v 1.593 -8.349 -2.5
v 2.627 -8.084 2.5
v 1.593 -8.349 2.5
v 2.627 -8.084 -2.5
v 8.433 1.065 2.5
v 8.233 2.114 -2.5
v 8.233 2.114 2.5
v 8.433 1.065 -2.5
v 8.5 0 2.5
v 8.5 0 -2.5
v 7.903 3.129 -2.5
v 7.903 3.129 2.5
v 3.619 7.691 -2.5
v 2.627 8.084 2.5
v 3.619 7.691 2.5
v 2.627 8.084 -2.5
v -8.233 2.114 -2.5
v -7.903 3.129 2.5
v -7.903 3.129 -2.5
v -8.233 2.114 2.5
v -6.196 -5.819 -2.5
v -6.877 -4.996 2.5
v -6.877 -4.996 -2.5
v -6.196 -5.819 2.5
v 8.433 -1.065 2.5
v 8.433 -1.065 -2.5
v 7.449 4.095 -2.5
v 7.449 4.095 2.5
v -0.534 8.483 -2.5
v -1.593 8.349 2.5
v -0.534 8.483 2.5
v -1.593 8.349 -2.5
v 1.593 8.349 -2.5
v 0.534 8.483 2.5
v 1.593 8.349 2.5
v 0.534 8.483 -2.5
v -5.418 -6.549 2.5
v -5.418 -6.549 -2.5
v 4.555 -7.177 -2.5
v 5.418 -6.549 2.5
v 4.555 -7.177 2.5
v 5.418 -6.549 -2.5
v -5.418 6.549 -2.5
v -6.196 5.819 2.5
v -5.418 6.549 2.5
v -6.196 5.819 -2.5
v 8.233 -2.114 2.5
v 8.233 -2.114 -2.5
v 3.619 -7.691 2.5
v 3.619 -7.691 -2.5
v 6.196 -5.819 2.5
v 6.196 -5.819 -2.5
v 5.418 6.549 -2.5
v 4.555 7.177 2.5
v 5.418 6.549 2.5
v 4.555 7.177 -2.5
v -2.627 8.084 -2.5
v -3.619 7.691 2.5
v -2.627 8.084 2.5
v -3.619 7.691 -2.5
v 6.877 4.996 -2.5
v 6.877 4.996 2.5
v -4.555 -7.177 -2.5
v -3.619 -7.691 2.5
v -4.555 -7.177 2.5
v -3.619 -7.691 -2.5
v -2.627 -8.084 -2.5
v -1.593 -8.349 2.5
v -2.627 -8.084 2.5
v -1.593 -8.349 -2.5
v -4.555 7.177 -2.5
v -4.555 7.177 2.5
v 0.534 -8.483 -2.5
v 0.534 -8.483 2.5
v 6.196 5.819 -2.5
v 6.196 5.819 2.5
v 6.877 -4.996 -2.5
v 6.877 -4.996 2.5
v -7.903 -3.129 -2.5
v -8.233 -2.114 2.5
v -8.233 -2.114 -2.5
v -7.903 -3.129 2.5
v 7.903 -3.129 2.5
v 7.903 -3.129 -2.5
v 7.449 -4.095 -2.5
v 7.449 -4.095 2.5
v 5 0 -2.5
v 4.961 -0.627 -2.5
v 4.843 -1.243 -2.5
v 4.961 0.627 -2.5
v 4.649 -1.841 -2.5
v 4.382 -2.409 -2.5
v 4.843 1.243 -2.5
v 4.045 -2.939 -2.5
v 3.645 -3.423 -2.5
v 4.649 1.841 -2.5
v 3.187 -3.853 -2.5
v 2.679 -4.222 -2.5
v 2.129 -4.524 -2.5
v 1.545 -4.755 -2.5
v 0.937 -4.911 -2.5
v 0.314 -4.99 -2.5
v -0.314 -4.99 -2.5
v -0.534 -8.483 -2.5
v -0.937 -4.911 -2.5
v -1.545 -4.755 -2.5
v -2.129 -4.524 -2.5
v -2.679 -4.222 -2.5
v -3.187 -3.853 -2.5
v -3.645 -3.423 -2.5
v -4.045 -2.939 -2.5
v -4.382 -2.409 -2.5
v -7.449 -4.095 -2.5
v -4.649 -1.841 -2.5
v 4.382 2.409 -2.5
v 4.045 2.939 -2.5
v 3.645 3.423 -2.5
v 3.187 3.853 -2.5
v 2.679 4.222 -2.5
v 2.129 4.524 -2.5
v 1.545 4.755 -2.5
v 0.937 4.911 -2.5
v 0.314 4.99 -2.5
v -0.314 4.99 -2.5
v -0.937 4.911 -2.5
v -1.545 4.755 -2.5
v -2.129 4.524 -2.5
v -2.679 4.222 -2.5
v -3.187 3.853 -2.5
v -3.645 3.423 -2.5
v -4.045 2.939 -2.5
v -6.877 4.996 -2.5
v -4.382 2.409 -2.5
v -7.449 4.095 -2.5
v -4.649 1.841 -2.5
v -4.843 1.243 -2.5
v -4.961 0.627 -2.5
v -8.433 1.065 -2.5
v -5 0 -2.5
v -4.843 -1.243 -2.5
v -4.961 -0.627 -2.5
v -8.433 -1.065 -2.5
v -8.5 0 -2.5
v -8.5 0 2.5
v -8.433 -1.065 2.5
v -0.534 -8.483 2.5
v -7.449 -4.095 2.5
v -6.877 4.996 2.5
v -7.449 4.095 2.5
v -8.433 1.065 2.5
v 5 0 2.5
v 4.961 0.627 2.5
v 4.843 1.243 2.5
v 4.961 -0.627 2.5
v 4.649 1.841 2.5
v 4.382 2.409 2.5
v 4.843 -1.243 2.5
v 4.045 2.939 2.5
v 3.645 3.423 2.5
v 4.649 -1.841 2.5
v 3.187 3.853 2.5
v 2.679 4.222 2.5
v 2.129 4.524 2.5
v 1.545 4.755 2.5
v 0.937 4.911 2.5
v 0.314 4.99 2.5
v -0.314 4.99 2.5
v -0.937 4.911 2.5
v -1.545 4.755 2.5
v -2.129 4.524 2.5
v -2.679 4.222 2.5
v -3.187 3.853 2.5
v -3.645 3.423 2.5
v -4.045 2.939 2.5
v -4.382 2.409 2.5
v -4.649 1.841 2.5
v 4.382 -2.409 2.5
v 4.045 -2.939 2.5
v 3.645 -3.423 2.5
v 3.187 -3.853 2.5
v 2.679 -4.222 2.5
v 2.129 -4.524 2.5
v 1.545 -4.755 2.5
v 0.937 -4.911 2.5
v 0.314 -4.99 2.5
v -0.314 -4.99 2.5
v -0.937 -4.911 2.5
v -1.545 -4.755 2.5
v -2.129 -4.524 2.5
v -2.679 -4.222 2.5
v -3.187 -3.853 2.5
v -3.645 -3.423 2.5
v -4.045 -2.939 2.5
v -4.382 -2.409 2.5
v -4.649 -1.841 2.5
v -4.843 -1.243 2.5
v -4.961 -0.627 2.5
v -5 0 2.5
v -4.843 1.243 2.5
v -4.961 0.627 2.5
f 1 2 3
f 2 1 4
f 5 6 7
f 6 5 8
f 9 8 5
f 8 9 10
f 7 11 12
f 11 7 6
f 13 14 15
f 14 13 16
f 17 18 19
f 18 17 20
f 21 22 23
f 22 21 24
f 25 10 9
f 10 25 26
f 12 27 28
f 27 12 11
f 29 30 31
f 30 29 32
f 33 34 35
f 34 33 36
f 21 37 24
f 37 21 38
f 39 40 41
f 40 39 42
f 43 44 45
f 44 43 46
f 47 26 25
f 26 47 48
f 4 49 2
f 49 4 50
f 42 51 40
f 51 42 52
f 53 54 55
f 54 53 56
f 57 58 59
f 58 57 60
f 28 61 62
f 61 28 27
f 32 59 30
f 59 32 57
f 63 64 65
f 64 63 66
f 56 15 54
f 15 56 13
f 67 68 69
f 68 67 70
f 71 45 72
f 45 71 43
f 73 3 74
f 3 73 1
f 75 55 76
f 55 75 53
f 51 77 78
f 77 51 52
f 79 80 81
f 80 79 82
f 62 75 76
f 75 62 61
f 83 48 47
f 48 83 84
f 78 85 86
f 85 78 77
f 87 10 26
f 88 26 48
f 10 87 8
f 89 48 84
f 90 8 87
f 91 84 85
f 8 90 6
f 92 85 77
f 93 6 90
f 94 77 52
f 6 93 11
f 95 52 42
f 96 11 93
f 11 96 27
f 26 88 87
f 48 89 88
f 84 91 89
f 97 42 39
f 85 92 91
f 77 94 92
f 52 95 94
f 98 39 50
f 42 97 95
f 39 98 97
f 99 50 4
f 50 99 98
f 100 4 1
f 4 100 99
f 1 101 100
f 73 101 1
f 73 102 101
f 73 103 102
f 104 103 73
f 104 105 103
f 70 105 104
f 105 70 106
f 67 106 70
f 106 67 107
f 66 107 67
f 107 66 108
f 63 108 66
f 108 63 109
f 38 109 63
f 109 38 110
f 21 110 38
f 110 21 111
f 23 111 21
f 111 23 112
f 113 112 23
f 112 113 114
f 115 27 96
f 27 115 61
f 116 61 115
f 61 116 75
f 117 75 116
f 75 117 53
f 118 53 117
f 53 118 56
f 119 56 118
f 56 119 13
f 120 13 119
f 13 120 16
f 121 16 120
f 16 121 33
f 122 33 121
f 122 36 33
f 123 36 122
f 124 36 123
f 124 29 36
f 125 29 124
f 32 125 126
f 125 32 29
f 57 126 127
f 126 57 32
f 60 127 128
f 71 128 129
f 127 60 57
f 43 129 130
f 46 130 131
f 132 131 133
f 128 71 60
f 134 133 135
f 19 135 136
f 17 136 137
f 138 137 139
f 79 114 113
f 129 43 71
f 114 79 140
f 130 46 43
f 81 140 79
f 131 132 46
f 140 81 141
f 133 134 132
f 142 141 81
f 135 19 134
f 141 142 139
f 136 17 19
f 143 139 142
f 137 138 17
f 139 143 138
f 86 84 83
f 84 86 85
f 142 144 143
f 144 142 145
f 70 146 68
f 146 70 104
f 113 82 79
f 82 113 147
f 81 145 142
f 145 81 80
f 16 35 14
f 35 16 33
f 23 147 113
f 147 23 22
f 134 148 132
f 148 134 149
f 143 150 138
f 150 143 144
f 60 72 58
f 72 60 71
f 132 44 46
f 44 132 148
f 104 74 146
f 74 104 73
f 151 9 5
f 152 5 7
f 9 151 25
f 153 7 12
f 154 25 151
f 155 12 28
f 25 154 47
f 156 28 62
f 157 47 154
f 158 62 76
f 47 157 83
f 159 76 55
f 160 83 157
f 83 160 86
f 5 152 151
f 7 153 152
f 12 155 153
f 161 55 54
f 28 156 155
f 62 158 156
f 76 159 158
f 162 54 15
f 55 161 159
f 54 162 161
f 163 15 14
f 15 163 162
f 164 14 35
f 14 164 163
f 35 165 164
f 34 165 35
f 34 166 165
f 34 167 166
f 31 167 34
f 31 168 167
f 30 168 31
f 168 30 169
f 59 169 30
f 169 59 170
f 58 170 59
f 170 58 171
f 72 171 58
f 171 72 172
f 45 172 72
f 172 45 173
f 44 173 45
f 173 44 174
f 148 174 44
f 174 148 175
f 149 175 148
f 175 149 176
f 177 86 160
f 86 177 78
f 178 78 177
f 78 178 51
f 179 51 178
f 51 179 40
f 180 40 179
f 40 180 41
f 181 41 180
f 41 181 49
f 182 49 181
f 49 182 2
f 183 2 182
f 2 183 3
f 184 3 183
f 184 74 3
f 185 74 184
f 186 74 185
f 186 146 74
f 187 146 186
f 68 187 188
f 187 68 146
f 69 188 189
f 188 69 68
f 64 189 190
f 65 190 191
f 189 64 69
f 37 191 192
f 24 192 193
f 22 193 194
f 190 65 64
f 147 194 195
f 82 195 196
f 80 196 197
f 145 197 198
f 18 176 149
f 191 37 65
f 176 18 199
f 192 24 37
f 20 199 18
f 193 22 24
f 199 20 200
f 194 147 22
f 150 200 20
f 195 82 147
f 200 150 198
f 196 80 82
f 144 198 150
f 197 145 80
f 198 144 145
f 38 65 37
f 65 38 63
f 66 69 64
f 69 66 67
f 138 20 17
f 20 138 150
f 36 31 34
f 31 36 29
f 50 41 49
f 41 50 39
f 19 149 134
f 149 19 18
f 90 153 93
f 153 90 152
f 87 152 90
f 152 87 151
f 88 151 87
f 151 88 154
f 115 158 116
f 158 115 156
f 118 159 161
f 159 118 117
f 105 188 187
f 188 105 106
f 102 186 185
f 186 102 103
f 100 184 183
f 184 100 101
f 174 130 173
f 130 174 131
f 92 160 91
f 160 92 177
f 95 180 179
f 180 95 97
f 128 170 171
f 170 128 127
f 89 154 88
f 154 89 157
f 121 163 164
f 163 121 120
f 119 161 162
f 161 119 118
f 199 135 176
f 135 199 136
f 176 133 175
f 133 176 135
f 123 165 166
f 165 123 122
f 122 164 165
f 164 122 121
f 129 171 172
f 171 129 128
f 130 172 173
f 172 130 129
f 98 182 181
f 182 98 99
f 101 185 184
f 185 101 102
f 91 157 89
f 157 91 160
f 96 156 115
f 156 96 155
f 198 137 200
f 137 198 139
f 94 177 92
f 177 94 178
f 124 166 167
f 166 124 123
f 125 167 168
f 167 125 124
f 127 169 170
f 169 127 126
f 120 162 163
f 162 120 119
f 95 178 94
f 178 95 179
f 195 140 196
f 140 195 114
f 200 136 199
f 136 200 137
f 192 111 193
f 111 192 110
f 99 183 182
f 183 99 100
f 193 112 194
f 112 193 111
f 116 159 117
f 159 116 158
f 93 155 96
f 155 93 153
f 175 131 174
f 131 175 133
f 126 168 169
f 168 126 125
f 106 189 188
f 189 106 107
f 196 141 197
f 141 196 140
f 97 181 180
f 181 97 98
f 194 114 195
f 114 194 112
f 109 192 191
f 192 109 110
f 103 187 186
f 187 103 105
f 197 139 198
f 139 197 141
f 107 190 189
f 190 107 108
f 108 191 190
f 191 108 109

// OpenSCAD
$fn = 50;


difference() {
	union() {
		translate(v = [0, 0, -2.5000000000]) {
			cylinder(h = 5, r = 8.5000000000);
		}
	}
	union() {
		translate(v = [0, 0, -100.0000000000]) {
			cylinder(h = 200, r = 5.0000000000);
		}
	}
}
